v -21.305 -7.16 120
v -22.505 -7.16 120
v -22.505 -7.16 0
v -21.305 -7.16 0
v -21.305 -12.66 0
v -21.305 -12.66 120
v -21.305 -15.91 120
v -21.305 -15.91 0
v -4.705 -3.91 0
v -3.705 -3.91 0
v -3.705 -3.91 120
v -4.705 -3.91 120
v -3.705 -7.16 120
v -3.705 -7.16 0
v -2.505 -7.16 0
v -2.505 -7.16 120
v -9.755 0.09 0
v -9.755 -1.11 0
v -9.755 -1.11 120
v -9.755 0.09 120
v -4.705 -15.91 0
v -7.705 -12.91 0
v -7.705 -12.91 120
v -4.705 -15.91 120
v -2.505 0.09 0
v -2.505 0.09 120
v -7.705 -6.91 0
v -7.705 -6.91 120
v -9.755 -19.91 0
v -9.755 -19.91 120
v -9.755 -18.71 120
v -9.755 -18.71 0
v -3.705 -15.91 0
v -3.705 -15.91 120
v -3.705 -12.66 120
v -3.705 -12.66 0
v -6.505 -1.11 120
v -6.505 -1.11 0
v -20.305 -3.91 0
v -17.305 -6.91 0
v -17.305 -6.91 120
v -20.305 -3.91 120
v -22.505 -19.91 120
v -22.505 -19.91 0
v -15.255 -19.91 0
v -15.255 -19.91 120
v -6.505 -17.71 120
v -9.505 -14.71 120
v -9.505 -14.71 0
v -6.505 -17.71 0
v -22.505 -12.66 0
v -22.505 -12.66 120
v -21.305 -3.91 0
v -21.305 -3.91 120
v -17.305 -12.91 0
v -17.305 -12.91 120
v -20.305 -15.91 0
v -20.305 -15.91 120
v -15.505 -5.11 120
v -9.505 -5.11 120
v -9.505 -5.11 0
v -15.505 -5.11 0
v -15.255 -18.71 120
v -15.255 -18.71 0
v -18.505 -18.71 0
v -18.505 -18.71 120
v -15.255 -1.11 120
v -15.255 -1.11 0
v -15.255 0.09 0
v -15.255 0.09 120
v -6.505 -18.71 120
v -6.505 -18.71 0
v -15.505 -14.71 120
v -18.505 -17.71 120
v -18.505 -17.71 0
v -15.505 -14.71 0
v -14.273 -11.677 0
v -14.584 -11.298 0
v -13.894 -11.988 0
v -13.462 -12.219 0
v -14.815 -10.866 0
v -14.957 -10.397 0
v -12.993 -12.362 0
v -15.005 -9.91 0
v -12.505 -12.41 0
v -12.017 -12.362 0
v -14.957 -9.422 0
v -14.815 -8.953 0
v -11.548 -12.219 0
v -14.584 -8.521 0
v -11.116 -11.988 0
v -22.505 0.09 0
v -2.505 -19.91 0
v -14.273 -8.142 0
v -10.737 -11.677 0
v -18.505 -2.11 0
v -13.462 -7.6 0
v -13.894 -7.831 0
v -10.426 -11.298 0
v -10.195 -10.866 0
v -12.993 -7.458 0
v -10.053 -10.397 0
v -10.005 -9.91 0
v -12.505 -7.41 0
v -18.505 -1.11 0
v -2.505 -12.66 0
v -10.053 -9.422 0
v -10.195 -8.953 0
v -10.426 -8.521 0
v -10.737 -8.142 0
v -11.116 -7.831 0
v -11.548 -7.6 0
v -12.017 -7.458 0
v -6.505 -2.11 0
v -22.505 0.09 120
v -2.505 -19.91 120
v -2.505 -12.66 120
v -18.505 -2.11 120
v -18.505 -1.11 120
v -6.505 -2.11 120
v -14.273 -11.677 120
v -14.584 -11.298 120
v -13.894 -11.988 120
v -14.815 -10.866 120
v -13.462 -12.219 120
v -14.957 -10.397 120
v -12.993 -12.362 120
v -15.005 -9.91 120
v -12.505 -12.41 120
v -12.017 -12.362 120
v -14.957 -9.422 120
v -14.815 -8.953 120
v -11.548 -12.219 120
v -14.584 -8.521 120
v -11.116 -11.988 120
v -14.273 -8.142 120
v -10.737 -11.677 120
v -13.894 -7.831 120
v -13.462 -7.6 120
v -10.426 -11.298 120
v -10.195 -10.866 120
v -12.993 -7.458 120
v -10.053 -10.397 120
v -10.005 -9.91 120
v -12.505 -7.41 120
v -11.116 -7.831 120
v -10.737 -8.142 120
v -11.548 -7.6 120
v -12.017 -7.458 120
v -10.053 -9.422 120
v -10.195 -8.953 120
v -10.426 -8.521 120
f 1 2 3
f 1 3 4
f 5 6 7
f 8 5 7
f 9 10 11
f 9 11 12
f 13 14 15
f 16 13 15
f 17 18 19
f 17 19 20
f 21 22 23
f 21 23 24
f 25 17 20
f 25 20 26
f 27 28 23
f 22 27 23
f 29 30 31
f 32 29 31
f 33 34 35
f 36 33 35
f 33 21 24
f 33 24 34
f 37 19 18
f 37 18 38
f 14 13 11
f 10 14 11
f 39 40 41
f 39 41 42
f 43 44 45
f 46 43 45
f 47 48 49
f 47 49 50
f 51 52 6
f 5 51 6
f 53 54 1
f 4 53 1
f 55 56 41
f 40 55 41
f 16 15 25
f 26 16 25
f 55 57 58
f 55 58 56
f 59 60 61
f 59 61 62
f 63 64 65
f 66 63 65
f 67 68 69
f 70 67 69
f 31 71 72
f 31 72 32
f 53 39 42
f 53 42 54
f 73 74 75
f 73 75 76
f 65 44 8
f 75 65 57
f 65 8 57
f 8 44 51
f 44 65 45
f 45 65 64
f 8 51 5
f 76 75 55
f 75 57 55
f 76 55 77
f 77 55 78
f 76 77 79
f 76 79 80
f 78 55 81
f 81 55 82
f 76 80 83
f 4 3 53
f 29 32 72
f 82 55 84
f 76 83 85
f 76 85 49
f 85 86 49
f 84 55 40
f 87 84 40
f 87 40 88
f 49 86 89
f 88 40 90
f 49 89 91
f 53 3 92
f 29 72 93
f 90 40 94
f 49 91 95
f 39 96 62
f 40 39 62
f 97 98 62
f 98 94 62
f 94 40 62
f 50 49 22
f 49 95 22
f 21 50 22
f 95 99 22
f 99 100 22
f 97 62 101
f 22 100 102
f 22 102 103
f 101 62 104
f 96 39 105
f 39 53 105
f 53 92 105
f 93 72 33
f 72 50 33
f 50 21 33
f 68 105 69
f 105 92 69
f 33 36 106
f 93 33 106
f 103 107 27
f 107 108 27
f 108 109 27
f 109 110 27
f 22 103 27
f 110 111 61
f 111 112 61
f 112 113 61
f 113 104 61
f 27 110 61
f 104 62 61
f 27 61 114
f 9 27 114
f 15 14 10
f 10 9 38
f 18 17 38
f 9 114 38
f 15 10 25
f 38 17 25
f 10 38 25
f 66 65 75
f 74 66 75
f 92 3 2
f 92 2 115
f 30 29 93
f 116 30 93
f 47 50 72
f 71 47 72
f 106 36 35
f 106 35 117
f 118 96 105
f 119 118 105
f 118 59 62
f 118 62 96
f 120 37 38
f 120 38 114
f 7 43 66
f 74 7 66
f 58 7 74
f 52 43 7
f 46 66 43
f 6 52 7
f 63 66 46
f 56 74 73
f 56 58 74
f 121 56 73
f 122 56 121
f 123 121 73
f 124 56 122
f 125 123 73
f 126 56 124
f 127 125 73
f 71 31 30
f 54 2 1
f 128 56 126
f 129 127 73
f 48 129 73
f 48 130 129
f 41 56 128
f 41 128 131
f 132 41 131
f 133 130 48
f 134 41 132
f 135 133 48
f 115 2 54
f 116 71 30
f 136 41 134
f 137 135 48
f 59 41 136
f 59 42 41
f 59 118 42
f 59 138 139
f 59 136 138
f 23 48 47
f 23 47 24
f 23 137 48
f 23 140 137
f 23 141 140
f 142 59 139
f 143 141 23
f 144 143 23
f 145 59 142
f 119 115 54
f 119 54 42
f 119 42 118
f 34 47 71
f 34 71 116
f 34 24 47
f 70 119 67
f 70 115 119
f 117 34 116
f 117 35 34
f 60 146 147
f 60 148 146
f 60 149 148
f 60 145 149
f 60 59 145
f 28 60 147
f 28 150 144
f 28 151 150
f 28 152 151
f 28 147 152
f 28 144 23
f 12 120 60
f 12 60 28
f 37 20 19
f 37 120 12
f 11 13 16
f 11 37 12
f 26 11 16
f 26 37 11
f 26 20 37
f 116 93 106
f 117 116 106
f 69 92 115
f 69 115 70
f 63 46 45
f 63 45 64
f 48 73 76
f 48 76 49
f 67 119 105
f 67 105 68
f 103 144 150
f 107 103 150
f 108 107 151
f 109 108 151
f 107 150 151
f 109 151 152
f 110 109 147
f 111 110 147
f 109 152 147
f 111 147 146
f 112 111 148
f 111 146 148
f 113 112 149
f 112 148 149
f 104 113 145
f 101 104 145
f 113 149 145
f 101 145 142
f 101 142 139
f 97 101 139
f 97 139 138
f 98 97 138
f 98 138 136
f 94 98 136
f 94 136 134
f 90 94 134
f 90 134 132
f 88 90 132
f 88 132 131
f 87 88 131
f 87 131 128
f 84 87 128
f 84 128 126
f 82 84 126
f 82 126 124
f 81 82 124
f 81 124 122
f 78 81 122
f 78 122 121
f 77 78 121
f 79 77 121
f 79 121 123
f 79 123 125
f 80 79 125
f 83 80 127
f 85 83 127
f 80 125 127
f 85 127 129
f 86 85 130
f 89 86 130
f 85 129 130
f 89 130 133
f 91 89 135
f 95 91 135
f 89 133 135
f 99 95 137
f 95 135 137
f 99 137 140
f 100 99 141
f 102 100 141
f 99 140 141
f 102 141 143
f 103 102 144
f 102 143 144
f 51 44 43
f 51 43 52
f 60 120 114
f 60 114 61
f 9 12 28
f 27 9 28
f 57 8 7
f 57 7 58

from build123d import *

# Parameters (mm, degrees)
ESQUISSE1_W             = 20
ESQUISSE1_H             = 20
BOSS_EXTRU_1_DEPTH      = 120
ESQUISSE2_W             = 1.2
ESQUISSE2_H             = 5.5
ESQUISSE2_W_2           = 5.5
ESQUISSE2_H_2           = 1.2
ENL_V_MAT_EXTRU_1_DEPTH = 121
ENL_V_MAT_EXTRU_2_DEPTH = 121
ESQUISSE4_R             = 2.5
ENL_V_MAT_EXTRU_3_DEPTH = 121


with BuildPart() as part:
    # Esquisse1 → Boss.-Extru.1 (new body)
    with BuildSketch(Plane.XY):
        with Locations((-12.505109137, -9.909560068)):
            Rectangle(ESQUISSE1_W, ESQUISSE1_H)
    extrude(amount=BOSS_EXTRU_1_DEPTH)

    # Esquisse2 → Enlèv. mat.-Extru.1 (cut, through all)
    with BuildSketch(Plane.XY.offset(120)):
        with Locations((-21.905109137, -9.909560068)):
            Rectangle(ESQUISSE2_W, ESQUISSE2_H)
        with Locations((-12.505109137, -0.509560068)):
            Rectangle(ESQUISSE2_W_2, ESQUISSE2_H_2)
        with Locations((-3.105109137, -9.909560068)):
            Rectangle(ESQUISSE2_W, ESQUISSE2_H)
        with Locations((-12.505109137, -19.309560068)):
            Rectangle(ESQUISSE2_W_2, ESQUISSE2_H_2)
    extrude(amount=-ENL_V_MAT_EXTRU_1_DEPTH, mode=Mode.SUBTRACT)

    # Esquisse3 → Enlèv. mat.-Extru.2 (cut, through all)
    with BuildSketch(Plane.XY.offset(120)):
        Polygon((-21.305109137, -15.909560068), (-20.305109137, -15.909560068), (-17.305109137, -12.909560068), (-17.305109137, -6.909560068), (-20.305109137, -3.909560068), (-21.305109137, -3.909560068), align=None)
        Polygon((-18.505109137, -1.109560068), (-6.505109137, -1.109560068), (-6.505109137, -2.109560068), (-9.505109137, -5.109560068), (-15.505109137, -5.109560068), (-18.505109137, -2.109560068), align=None)
        Polygon((-3.705109137, -3.909560068), (-4.705109137, -3.909560068), (-7.705109137, -6.909560068), (-7.705109137, -12.909560068), (-4.705109137, -15.909560068), (-3.705109137, -15.909560068), align=None)
        Polygon((-6.505109137, -18.709560068), (-18.505109137, -18.709560068), (-18.505109137, -17.709560068), (-15.505109137, -14.709560068), (-9.505109137, -14.709560068), (-6.505109137, -17.709560068), align=None)
    extrude(amount=-ENL_V_MAT_EXTRU_2_DEPTH, mode=Mode.SUBTRACT)

    # Esquisse4 → Enlèv. mat.-Extru.3 (cut, through all)
    with BuildSketch(Plane.XY.offset(120)):
        with Locations((-12.505109137, -9.909560068)):
            Circle(ESQUISSE4_R)
    extrude(amount=-ENL_V_MAT_EXTRU_3_DEPTH, mode=Mode.SUBTRACT)


solid = part.part
